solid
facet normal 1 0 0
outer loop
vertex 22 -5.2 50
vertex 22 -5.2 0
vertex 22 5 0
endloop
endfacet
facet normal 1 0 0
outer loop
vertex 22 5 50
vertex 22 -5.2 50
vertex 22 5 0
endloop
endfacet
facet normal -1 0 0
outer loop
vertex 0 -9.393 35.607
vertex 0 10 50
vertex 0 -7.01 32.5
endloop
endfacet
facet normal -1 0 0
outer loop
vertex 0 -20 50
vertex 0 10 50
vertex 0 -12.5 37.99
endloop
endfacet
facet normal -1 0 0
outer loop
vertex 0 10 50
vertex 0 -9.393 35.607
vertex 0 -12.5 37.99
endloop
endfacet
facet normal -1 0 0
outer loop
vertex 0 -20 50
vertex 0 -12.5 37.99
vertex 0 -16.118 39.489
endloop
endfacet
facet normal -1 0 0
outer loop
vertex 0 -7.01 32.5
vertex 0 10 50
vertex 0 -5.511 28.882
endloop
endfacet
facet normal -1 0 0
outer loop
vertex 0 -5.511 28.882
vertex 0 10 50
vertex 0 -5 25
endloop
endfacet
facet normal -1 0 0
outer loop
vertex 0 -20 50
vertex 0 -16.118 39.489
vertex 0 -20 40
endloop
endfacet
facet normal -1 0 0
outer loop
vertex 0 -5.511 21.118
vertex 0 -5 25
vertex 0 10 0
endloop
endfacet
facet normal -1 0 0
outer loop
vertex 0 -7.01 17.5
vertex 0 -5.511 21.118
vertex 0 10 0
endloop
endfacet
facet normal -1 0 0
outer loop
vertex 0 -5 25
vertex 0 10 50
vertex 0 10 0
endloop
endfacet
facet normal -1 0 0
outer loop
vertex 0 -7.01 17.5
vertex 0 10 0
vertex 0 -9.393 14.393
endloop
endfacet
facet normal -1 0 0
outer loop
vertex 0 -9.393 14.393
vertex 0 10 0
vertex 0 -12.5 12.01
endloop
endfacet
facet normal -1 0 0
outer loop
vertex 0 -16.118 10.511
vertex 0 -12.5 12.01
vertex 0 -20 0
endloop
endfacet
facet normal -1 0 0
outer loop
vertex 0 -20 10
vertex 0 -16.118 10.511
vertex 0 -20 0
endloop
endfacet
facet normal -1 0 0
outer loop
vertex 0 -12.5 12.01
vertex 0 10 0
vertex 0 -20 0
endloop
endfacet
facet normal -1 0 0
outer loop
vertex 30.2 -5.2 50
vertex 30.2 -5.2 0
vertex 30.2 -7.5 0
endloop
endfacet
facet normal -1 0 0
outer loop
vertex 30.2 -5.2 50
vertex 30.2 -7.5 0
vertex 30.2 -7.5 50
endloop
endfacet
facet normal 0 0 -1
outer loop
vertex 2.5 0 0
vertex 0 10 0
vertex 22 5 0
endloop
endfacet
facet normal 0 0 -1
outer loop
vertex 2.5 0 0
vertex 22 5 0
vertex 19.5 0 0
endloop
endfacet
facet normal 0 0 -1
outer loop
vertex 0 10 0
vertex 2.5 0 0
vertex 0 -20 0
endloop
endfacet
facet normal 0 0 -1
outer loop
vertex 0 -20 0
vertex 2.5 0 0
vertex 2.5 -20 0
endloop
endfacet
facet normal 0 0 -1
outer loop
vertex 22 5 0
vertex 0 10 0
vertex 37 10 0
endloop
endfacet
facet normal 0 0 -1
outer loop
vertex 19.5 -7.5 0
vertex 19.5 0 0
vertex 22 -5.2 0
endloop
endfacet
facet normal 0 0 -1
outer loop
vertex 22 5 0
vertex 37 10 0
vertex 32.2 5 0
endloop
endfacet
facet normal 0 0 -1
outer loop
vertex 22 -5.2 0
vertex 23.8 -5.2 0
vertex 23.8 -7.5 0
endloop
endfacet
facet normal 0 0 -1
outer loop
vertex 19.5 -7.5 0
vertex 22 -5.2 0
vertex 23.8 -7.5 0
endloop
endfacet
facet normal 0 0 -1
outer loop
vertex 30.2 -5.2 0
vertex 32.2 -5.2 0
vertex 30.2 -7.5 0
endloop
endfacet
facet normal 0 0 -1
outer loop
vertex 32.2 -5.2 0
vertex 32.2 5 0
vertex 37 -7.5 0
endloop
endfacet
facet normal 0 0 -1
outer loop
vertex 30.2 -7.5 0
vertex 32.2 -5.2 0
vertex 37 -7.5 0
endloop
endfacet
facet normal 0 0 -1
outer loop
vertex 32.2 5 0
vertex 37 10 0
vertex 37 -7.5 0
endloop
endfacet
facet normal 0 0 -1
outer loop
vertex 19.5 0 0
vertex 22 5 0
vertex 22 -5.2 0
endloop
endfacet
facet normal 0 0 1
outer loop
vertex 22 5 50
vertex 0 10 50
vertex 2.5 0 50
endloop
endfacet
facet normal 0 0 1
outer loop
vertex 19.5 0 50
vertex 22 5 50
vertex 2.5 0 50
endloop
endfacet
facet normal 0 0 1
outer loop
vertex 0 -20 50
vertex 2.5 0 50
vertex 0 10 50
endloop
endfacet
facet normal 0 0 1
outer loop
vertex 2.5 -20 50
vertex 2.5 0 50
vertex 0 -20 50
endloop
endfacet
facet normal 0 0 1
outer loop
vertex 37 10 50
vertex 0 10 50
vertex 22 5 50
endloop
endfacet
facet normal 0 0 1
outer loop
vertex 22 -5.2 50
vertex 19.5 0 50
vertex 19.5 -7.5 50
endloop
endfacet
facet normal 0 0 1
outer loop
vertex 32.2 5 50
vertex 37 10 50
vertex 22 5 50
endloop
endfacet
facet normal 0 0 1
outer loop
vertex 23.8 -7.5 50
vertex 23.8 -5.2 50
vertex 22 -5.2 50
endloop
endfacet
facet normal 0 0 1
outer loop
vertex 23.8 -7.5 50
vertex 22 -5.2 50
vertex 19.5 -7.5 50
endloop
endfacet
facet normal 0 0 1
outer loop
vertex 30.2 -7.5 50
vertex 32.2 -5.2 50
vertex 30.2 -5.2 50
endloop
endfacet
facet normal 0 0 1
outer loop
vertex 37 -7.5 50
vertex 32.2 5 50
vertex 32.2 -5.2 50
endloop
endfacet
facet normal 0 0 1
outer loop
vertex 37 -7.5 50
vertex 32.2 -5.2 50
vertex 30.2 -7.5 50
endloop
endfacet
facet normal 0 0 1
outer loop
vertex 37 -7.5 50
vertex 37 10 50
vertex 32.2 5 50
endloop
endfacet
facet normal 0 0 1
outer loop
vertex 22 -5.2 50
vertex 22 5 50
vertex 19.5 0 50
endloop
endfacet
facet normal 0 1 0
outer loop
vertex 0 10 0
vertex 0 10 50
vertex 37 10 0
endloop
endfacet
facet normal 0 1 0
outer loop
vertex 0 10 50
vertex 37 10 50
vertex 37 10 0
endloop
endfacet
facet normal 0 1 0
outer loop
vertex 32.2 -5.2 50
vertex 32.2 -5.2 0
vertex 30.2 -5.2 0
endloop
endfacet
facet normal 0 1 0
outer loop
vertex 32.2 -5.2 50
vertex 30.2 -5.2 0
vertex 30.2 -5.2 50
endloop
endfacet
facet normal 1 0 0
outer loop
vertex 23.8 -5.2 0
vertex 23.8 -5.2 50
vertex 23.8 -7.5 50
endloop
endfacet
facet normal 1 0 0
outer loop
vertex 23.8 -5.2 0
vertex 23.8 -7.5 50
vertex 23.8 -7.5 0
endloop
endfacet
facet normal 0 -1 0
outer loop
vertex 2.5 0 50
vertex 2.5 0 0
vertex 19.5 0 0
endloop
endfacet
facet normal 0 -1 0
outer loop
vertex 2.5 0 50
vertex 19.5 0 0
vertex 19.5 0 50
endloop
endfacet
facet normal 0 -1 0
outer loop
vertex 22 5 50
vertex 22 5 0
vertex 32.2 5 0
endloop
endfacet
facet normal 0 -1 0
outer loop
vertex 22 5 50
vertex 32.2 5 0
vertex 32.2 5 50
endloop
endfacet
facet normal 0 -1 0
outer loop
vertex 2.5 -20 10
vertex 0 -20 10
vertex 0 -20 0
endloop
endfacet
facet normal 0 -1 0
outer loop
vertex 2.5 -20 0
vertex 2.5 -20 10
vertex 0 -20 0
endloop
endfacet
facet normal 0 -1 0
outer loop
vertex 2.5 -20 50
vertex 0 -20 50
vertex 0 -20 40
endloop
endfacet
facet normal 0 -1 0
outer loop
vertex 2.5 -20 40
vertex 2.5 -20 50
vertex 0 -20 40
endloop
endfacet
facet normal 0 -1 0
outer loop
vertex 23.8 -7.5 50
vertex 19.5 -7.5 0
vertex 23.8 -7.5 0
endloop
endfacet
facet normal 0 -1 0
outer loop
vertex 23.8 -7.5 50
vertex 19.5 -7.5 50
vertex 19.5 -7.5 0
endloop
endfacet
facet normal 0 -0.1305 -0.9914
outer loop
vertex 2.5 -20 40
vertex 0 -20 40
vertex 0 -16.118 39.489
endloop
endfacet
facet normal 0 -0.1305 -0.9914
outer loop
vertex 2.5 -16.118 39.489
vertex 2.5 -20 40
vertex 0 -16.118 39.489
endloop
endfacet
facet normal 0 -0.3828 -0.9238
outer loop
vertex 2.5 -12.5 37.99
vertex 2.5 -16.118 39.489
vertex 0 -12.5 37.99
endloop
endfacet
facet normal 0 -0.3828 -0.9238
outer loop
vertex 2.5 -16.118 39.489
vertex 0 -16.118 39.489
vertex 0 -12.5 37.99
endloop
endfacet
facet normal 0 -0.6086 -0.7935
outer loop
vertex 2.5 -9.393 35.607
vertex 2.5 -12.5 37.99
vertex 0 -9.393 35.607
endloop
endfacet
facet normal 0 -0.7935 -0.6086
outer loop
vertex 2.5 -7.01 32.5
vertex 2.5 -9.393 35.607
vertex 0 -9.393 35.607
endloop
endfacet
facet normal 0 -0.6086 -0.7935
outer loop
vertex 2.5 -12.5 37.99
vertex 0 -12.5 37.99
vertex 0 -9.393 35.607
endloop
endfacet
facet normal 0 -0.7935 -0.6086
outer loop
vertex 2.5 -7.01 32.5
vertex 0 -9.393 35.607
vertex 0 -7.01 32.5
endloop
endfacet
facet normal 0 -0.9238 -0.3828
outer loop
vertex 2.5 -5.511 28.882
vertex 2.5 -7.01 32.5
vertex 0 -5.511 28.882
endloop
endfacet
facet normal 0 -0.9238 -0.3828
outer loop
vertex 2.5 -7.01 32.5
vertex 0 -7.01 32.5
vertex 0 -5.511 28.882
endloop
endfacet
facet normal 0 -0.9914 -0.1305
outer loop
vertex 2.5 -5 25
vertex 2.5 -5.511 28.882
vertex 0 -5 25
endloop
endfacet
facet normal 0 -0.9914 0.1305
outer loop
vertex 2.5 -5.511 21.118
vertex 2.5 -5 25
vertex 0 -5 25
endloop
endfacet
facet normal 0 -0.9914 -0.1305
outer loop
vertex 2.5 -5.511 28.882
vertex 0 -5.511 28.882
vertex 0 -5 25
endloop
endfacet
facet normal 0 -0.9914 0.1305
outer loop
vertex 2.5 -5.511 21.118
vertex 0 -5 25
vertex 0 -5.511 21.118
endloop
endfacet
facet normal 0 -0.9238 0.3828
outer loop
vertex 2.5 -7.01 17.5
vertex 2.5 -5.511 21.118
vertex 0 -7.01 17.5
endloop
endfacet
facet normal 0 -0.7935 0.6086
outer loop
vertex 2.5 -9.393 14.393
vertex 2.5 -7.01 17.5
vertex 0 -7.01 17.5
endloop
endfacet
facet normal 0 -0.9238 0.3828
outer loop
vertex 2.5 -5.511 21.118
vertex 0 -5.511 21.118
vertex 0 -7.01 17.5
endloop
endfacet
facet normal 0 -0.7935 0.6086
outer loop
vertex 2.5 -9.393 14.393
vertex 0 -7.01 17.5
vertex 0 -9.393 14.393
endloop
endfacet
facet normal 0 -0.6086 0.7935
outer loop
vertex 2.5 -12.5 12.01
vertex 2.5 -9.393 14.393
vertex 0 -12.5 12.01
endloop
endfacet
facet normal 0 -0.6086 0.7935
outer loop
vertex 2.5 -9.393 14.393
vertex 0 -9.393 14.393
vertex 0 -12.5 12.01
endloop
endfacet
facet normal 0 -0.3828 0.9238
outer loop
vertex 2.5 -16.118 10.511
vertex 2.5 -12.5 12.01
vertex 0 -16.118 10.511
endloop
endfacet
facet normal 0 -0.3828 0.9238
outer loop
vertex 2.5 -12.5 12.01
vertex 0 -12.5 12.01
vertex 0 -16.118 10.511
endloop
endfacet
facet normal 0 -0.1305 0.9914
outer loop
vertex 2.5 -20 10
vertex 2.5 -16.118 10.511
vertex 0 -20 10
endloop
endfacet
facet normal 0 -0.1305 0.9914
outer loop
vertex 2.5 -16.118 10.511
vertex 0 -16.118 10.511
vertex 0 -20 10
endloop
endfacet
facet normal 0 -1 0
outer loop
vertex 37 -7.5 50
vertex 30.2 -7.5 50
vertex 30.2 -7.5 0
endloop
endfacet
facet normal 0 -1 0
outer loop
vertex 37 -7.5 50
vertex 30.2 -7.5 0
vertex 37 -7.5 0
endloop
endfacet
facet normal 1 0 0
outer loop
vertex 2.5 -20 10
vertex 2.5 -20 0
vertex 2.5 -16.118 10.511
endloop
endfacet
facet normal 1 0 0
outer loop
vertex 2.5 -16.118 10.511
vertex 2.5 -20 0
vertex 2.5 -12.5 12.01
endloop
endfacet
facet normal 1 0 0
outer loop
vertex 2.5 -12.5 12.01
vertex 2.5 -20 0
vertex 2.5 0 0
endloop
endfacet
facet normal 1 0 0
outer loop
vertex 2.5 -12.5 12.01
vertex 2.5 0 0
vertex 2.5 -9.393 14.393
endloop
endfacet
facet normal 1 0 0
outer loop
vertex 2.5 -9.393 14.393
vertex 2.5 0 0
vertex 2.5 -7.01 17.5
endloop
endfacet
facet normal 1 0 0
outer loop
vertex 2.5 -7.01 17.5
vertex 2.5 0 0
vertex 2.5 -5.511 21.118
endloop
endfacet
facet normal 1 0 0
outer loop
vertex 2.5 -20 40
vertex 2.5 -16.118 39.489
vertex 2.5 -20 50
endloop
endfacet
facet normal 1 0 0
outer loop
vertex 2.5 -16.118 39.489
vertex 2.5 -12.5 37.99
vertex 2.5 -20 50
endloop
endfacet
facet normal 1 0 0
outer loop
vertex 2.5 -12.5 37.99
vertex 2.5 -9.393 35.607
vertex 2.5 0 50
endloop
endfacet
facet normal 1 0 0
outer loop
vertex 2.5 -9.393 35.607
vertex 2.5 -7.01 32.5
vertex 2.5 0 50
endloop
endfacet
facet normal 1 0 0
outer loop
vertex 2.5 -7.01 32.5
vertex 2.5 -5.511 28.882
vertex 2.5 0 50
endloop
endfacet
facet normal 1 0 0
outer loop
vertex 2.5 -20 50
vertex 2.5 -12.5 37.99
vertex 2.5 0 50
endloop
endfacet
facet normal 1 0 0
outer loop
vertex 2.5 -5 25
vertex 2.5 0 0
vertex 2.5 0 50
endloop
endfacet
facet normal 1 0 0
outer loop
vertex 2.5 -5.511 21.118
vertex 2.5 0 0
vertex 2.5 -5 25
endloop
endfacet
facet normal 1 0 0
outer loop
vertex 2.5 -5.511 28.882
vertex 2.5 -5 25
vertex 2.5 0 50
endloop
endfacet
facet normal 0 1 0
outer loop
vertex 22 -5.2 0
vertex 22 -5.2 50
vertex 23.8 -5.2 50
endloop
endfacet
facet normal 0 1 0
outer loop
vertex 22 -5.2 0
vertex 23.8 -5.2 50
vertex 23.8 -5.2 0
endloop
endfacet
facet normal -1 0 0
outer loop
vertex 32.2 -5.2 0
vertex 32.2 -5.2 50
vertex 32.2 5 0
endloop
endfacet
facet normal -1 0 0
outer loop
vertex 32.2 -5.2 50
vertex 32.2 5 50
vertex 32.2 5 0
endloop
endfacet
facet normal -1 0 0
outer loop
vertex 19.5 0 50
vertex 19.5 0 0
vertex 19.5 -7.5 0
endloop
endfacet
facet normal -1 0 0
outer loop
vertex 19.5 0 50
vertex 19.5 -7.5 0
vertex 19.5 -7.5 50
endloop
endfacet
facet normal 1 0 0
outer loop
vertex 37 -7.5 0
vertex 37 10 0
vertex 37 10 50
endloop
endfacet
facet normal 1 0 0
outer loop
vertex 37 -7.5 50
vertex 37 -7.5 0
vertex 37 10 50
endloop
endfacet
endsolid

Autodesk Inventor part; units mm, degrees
ref_plane "YZ Plane" through (0, 0, 0) normal (1, 0, 0) x (0, 1, 0)
ref_plane "XZ Plane" through (0, 0, 0) normal (0, 1, 0) x (-1, 0, 0)
ref_plane "XY Plane" through (0, 0, 0) normal (0, 0, 1) x (1, 0, 0)
sketch "Skizze1" plane through (0, 0, 0) normal (0, 0, 1) x (1, 0, 0)
  line L0 (0, 0) -> (22, 0)
  line L1 (22, 0) -> (22, 10)
  line L2 (22, 10) -> (0, 10)
  line L3 (0, 10) -> (0, 0)
  dimension "d0" = 22
  dimension "d1" = 10
extrude "Extrusion1" add sketch "Skizze1" along normal blind 50
sketch "Skizze3" plane through (22, 0, 0) normal (1, 0, 0) x (0, 0, -1)
  line L0 (-50, 0) -> (-50, 10) projected
  line L1 (0, 0) -> (0, 10) projected
  line L2 (-50, 10) -> (0, 10)
  line L3 (0, 10) -> (0, 5)
  line L4 (0, 5) -> (-50, 5)
  line L5 (-50, 5) -> (-50, 10)
extrude "Extrusion2" add sketch "Skizze3" along normal blind 15
sketch "Skizze4" plane through (22, 5, 0) normal (0, -1, 0) x (1, 0, 0)
  line L0 (-22, 50) -> (15, 50) projected
  line L1 (15, 50) -> (10.2, 50)
  line L2 (10.2, 50) -> (10.2, 0)
  line L3 (10.2, 0) -> (15, 0)
  line L4 (15, 0) -> (15, 50)
  line L5 (0, 0) -> (0, 50) projected
  point P0 (-22, 0)
  dimension "d6" = 10.2
extrude "Extrusion3" add sketch "Skizze4" along normal blind 5
sketch "Skizze5" plane through (0, 0, 0) normal (0, -1, 0) x (1, 0, 0)
  line L0 (22, 0) -> (22, 50) projected
  line L1 (22, 50) -> (17, 50)
  line L2 (17, 50) -> (17, 0)
  line L3 (17, 0) -> (22, 0)
  line L4 (22, 0) -> (22, 50)
  line L5 (32.2, 50) -> (32.2, 0) projected
  line L6 (37, 0) -> (37, 50) projected
  line L7 (32.2, 50) -> (37, 50)
  line L8 (37, 50) -> (37, 0)
  line L9 (37, 0) -> (32.2, 0)
  line L10 (32.2, 0) -> (32.2, 50)
  point P0 (0, 0)
  dimension "d9" = 5
extrude "Extrusion4" add sketch "Skizze5" along normal blind 10
sketch "Skizze6" plane through (32.2, 5, 0) normal (-1, 0, 0) x (0, 0, 1)
  line L0 (50, 5) -> (50, -15) projected
  line L1 (0, 5) -> (0, -15) projected
  line L2 (50, -15) -> (0, -15)
  line L3 (0, -15) -> (0, -10.2)
  line L4 (0, -10.2) -> (50, -10.2)
  line L5 (50, -10.2) -> (50, -15)
  point P0 (0, -5)
  point P1 (0, -15)
  point P2 (50, -10.2)
  dimension "d12" = 4.8
extrude "Extrusion5" add sketch "Skizze6" along normal blind 2
ref_plane "Arbeitsebene1" through (27, 0, 0) normal (-1, 0, 0) x (0, 0, 1)
mirror "Spiegeln1" about plane through (27, 0, 0) normal (-1, 0, 0) of "Extrusion5"
sketch "Skizze7" plane through (0, -10, 0) normal (0, -1, 0) x (1, 0, 0)
  line L0 (0, 50) -> (37, 50) projected
  line L1 (17, 0) -> (17, 50) projected
  line L2 (37, 50) -> (17, 50)
  line L3 (17, 50) -> (17, 0)
  line L4 (17, 0) -> (37, 0)
  line L5 (37, 0) -> (37, 50)
  point P0 (0, 0)
extrude "Extrusion6" cut sketch "Skizze7" against normal blind 2.5
sketch "Skizze8" plane through (0, 0, 0) normal (-1, 0, 0) x (0, 0, 1)
  point P0 (0, 0)
sketch "Skizze9" plane through (0, 0, 0) normal (-1, 0, 0) x (0, 0, 1)
  line L0 (50, -20) -> (0, -20)
  line L1 (0, -20) -> (0, 30)
  line L2 (0, 30) -> (50, 30)
  line L3 (50, 30) -> (50, -20)
  line L4 (0, 0) -> (50, 0) projected
  line L5 (50, 10) -> (50, 0) projected
  point P0 (50, 5)
  dimension "d17" = 50
  dimension "d18" = 50
  dimension "d19" = 20
  dimension "d20" = 0
extrude "Extrusion7" add sketch "Skizze9" against normal blind 2.5
sketch "Skizze10" plane through (0, -20, 0) normal (-1, 0, 0) x (0, 0, 1)
  circle A0 centre (25, 0) radius 15
  line L0 (0, 0) -> (50, 0) projected
  point P0 (0, 20)
  point P1 (25, 0)
  point P2 (10, 0)
  point P3 (40, 0)
  dimension "d23" = 30
extrude "Extrusion8" cut sketch "Skizze10" against normal blind 2.5 contours L0 A0 picked at (21.7322, 7.6351)
sketch "Skizze11" plane through (17, 0, 0) normal (-1, 0, 0) x (0, 0, 1)
  line L0 (0, -7.5) -> (50, -7.5) projected
  line L1 (0, 0) -> (0, -7.5) projected
  line L2 (50, -7.5) -> (0, -7.5)
  line L3 (0, -7.5) -> (0, 0)
  line L4 (0, 0) -> (50, 0)
  line L5 (50, 0) -> (50, -7.5)
extrude "Extrusion9" cut sketch "Skizze11" against normal blind 2.5
sketch "Skizze12" plane through (2.5, 0, 0) normal (1, 0, 0) x (0, 0, -1)
  line L0 (-50, 10) -> (-50, -7.5) projected
  line L1 (0, 30) -> (0, -20) projected
  line L2 (-50, 10) -> (0, 10)
  line L3 (0, 10) -> (0, 30)
  line L4 (0, 30) -> (-50, 30)
  line L5 (-50, 30) -> (-50, 10)
  point P0 (0, 0)
  point P1 (0, 10)
extrude "Extrusion10" cut sketch "Skizze12" against normal blind 10
properties part number "Schiene"
